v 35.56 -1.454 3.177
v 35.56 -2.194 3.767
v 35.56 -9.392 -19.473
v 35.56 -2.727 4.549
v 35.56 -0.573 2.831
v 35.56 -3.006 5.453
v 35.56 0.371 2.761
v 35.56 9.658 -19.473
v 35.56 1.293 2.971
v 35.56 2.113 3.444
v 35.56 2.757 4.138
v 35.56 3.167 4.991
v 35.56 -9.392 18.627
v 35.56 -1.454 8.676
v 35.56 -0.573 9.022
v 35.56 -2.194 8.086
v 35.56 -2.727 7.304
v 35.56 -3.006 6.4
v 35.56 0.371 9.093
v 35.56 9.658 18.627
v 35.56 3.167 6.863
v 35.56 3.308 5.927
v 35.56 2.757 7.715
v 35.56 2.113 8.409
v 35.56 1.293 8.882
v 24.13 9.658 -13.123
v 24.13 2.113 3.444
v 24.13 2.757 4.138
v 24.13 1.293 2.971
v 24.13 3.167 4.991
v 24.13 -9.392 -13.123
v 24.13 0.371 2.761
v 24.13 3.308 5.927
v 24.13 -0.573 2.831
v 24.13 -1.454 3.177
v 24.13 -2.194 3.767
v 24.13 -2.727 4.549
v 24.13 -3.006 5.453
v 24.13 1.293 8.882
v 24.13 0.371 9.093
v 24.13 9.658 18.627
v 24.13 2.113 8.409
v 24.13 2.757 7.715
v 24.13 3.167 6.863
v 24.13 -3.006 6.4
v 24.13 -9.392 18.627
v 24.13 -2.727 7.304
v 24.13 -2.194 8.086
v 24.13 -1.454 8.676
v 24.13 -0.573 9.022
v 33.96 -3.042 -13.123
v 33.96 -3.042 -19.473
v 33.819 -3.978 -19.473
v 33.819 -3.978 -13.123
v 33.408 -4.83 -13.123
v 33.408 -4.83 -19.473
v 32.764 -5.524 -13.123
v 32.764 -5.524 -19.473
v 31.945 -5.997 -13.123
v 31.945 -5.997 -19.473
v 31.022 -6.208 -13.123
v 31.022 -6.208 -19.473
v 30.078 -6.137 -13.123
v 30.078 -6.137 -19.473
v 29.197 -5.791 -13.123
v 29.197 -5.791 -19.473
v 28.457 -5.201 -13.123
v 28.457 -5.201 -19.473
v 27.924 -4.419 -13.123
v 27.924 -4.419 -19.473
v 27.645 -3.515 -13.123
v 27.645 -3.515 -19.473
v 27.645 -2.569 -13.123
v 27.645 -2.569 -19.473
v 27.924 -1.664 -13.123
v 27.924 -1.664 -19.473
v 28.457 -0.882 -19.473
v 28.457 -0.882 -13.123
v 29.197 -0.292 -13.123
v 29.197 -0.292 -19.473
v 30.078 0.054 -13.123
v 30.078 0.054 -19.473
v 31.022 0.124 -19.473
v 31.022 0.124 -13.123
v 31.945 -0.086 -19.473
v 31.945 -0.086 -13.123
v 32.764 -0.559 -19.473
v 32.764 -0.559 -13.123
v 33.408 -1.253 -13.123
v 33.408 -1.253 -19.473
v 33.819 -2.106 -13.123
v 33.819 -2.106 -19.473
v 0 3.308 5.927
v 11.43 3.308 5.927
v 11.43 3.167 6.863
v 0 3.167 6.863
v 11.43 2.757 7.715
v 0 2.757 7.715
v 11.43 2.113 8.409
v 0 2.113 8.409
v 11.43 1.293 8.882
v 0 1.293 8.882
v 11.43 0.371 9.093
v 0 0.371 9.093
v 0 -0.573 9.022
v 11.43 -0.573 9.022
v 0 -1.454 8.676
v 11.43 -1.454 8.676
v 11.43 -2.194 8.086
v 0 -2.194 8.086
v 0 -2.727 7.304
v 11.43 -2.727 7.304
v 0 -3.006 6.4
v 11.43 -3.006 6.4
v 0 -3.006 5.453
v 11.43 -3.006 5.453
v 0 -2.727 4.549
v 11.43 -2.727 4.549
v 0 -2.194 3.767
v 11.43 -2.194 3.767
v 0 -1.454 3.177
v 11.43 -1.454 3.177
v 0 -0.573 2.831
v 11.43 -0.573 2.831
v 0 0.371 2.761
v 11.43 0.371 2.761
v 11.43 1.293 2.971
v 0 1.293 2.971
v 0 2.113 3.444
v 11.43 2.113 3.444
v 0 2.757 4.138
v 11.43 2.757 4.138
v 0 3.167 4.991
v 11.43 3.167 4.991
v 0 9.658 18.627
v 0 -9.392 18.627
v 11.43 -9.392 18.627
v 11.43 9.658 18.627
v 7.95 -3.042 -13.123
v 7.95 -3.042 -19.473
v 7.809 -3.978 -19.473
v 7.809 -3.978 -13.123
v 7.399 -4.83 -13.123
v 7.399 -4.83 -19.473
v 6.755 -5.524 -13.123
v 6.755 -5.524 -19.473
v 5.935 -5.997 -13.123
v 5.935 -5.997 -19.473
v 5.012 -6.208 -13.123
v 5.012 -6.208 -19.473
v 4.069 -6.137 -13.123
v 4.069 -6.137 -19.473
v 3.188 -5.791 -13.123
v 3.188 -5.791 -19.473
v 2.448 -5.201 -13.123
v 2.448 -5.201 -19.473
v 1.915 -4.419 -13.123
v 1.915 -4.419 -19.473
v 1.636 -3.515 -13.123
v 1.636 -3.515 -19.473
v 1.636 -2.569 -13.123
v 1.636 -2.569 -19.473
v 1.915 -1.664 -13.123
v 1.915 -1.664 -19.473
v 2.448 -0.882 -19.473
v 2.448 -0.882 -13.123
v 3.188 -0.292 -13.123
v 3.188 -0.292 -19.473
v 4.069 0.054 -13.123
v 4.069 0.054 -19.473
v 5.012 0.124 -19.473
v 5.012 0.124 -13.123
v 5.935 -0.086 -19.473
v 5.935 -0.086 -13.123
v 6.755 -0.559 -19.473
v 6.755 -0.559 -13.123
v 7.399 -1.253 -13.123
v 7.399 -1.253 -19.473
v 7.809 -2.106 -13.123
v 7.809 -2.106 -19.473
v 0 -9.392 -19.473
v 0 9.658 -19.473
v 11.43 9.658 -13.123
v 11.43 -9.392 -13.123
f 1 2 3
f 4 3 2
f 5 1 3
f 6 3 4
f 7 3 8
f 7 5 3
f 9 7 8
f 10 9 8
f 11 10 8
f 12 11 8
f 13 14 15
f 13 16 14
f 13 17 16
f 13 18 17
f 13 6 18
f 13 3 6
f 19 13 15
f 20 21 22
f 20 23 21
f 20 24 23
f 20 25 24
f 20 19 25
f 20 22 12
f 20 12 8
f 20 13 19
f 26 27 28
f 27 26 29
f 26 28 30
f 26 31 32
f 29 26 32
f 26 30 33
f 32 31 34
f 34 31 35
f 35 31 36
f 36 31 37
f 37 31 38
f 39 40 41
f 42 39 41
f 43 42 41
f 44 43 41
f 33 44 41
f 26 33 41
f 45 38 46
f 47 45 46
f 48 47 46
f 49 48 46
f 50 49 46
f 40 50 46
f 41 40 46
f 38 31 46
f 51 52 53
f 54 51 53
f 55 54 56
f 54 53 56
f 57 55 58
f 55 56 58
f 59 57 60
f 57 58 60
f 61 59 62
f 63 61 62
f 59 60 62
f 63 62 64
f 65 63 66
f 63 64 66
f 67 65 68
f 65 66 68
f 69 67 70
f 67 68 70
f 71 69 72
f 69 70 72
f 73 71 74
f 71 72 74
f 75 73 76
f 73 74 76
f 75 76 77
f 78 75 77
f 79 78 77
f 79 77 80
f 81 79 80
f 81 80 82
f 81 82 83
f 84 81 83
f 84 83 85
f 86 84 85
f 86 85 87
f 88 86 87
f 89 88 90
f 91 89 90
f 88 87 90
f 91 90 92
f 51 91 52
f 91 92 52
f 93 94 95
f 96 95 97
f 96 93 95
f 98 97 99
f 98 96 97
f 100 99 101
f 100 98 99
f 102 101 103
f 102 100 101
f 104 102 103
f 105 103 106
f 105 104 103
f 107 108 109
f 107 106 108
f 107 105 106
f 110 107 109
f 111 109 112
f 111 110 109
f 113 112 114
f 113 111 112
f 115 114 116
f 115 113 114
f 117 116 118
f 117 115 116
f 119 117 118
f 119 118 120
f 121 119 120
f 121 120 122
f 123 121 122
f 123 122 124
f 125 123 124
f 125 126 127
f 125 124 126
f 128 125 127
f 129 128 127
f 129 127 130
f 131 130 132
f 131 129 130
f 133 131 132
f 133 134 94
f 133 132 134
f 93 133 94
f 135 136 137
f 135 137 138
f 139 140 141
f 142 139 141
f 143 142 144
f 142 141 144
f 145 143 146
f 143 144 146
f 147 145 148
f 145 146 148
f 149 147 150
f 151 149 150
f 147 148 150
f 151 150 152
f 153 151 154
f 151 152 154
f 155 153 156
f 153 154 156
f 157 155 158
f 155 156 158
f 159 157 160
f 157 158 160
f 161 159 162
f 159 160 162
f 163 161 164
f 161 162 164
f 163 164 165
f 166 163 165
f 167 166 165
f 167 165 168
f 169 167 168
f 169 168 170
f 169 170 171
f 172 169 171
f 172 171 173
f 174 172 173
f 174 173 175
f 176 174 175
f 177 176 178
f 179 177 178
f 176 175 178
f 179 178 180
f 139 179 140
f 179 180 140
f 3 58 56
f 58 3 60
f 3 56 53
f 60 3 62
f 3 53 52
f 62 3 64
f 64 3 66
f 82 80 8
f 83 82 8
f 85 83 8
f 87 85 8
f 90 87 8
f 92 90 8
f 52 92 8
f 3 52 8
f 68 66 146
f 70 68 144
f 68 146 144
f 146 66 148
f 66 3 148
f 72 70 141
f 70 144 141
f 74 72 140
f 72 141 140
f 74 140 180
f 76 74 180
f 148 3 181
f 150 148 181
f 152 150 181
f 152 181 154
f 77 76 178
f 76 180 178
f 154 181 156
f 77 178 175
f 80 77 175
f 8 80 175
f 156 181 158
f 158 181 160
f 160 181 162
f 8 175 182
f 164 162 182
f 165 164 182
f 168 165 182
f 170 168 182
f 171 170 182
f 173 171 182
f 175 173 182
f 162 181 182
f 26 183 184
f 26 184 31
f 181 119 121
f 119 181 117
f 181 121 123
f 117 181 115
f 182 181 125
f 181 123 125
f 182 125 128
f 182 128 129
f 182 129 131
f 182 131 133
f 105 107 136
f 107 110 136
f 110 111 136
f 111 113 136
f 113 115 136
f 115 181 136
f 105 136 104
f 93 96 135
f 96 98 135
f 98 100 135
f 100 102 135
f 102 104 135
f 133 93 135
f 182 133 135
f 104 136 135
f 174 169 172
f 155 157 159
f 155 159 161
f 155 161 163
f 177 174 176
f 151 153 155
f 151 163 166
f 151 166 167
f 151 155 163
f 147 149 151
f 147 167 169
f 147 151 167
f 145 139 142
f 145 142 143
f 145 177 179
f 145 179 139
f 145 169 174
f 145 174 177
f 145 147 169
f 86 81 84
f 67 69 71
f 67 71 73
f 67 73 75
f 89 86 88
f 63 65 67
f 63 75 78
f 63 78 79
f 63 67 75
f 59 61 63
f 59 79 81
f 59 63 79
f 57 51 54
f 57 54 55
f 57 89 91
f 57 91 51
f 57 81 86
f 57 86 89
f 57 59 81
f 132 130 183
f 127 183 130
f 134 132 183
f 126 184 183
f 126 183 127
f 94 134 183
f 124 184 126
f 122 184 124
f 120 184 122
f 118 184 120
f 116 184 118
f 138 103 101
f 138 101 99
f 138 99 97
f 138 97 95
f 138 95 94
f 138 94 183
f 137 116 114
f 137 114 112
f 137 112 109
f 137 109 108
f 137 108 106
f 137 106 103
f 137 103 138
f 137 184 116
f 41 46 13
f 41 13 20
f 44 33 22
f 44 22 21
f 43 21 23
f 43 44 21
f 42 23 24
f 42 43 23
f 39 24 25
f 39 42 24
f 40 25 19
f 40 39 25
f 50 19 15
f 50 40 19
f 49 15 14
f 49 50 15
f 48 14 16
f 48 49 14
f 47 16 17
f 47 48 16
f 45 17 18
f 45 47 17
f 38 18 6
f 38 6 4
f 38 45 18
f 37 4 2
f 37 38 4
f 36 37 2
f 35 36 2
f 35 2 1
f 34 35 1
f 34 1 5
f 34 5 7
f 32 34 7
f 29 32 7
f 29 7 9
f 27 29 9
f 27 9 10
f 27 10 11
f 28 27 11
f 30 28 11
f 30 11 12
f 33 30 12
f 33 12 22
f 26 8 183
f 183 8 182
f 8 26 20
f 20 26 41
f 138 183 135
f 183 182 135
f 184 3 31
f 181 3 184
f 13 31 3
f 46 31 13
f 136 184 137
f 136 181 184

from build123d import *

# Parameters (mm, degrees)
F0_W     = 19.05
F0_H     = 38.1
F0_R     = 3.175
F1_DEPTH = 35.56
F2_R     = 3.175
F3_DEPTH = 6.35
F4_W     = 12.7
F4_H     = 31.75
F5_DEPTH = 35.56


with BuildPart() as f1:
    # F0 (on Right) → F1 (new body)
    with BuildSketch(Plane.YZ):
        with Locations((0.13327, -0.423332)):
            Rectangle(F0_W, F0_H)
        with Locations((0.13327, 5.926668)):
            Circle(F0_R, mode=Mode.SUBTRACT)
    extrude(amount=F1_DEPTH)

    # F2 (on face) → F3 (cut)
    with BuildSketch(Plane(origin=(0, 0, -19.473332), x_dir=(1, 0, 0), z_dir=(0, 0, -1))):
        with Locations((4.7752, 3.04173)):
            Circle(F2_R)
        with Locations((30.7848, 3.04173)):
            Circle(F2_R)
    extrude(amount=-F3_DEPTH, mode=Mode.SUBTRACT)

    # F4 (on face) → F5 (cut)
    with BuildSketch(Plane.XZ.offset(9.39173)):
        with Locations((17.78, 2.751668)):
            Rectangle(F4_W, F4_H)
    extrude(amount=-F5_DEPTH, mode=Mode.SUBTRACT)


solid = f1.part
